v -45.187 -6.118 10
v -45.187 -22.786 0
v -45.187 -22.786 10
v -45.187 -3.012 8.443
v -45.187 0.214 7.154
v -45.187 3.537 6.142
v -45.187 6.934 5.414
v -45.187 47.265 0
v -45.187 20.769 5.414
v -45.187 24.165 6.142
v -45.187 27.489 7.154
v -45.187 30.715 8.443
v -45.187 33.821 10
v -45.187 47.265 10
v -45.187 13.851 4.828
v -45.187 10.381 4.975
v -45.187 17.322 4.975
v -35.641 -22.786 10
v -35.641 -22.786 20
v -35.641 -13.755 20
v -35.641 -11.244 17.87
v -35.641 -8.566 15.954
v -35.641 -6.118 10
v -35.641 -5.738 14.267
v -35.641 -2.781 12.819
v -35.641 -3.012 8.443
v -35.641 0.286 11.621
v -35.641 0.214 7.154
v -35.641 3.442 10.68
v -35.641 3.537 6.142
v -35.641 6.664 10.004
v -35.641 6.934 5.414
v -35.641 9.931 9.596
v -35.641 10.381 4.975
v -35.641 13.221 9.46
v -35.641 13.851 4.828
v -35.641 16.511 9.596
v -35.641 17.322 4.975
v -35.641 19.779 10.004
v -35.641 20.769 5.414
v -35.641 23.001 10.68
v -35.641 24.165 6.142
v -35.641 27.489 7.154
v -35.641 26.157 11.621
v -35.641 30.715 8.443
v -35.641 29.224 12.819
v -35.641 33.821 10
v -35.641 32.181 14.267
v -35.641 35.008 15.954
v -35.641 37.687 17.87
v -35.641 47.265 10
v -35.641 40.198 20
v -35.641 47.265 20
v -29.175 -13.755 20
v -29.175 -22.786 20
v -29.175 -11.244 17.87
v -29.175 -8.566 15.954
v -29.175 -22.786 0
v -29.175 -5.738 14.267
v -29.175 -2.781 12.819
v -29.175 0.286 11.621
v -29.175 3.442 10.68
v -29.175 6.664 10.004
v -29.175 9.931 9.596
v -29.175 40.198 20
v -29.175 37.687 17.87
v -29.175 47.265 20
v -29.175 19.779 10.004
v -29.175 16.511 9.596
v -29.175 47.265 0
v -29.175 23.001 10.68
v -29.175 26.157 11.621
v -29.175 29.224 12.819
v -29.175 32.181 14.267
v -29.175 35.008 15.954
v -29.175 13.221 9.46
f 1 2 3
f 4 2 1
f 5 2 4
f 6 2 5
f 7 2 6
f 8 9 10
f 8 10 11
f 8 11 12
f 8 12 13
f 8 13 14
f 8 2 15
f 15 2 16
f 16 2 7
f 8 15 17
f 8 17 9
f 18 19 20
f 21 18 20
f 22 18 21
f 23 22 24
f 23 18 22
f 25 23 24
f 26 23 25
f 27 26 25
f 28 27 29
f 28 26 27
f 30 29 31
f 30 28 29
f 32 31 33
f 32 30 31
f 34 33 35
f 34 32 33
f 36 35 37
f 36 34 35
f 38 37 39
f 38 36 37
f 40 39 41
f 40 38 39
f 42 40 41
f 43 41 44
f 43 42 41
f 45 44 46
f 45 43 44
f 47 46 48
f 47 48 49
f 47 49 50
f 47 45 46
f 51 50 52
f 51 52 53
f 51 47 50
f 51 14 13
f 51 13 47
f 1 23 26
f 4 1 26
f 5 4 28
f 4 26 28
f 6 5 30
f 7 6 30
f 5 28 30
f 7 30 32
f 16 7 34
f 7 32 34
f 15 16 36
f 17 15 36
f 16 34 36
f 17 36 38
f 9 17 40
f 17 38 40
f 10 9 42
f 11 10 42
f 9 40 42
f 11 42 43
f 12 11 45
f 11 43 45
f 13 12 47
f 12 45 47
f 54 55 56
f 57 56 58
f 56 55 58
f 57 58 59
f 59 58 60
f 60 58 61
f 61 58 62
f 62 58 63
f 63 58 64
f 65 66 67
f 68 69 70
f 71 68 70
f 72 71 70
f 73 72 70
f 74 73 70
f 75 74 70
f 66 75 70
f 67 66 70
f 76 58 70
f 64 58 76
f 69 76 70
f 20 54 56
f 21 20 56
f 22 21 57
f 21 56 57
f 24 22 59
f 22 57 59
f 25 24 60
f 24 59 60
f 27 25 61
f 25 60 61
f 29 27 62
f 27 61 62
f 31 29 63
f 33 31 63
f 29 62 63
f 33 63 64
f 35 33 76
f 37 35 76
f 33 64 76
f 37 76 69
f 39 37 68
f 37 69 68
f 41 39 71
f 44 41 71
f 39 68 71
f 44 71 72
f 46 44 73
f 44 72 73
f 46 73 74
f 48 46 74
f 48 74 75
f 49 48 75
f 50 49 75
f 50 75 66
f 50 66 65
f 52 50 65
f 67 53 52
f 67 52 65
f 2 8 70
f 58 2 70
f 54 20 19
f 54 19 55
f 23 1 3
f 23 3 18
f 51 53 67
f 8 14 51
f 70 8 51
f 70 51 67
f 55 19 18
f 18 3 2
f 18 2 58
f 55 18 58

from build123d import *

# Parameters (mm, degrees)
F0_W     = 9.545457
F0_H     = 70.051323
F1_DEPTH = 10
F3_DEPTH = 50
F0_W_2   = 6.466273
F4_DEPTH = 20
F6_DEPTH = 50


with BuildPart() as f1:
    # F0 (on Top) → F1 (new body)
    with BuildSketch(Plane.XY):
        with Locations((-40.414223, 12.239737)):
            Rectangle(F0_W, F0_H)
    extrude(amount=F1_DEPTH)

    # F2 (on Right) → F3 (cut)
    with BuildSketch(Plane.YZ):
        with BuildLine():
            ThreePointArc((-10.673997, 12.938293), (14.378322, 4.831678), (39.214806, 13.577245))
            Line((39.214806, 13.577245), (-10.673997, 12.938293))
        make_face()
    extrude(amount=-F3_DEPTH, mode=Mode.SUBTRACT)

    # F0 (on Top) → F4 (join)
    with BuildSketch(Plane.XY):
        with Locations((-32.408358, 12.239737)):
            Rectangle(F0_W_2, F0_H)
    extrude(amount=F4_DEPTH)

    # F5 (on Right) → F6 (cut)
    with BuildSketch(Plane.YZ):
        with BuildLine():
            Line((46.000224, 26.69229), (-19.578034, 26.722144))
            ThreePointArc((-19.578034, 26.722144), (13.203243, 9.459906), (46.000224, 26.69229))
        make_face()
    extrude(amount=-F6_DEPTH, mode=Mode.SUBTRACT)


solid = f1.part
